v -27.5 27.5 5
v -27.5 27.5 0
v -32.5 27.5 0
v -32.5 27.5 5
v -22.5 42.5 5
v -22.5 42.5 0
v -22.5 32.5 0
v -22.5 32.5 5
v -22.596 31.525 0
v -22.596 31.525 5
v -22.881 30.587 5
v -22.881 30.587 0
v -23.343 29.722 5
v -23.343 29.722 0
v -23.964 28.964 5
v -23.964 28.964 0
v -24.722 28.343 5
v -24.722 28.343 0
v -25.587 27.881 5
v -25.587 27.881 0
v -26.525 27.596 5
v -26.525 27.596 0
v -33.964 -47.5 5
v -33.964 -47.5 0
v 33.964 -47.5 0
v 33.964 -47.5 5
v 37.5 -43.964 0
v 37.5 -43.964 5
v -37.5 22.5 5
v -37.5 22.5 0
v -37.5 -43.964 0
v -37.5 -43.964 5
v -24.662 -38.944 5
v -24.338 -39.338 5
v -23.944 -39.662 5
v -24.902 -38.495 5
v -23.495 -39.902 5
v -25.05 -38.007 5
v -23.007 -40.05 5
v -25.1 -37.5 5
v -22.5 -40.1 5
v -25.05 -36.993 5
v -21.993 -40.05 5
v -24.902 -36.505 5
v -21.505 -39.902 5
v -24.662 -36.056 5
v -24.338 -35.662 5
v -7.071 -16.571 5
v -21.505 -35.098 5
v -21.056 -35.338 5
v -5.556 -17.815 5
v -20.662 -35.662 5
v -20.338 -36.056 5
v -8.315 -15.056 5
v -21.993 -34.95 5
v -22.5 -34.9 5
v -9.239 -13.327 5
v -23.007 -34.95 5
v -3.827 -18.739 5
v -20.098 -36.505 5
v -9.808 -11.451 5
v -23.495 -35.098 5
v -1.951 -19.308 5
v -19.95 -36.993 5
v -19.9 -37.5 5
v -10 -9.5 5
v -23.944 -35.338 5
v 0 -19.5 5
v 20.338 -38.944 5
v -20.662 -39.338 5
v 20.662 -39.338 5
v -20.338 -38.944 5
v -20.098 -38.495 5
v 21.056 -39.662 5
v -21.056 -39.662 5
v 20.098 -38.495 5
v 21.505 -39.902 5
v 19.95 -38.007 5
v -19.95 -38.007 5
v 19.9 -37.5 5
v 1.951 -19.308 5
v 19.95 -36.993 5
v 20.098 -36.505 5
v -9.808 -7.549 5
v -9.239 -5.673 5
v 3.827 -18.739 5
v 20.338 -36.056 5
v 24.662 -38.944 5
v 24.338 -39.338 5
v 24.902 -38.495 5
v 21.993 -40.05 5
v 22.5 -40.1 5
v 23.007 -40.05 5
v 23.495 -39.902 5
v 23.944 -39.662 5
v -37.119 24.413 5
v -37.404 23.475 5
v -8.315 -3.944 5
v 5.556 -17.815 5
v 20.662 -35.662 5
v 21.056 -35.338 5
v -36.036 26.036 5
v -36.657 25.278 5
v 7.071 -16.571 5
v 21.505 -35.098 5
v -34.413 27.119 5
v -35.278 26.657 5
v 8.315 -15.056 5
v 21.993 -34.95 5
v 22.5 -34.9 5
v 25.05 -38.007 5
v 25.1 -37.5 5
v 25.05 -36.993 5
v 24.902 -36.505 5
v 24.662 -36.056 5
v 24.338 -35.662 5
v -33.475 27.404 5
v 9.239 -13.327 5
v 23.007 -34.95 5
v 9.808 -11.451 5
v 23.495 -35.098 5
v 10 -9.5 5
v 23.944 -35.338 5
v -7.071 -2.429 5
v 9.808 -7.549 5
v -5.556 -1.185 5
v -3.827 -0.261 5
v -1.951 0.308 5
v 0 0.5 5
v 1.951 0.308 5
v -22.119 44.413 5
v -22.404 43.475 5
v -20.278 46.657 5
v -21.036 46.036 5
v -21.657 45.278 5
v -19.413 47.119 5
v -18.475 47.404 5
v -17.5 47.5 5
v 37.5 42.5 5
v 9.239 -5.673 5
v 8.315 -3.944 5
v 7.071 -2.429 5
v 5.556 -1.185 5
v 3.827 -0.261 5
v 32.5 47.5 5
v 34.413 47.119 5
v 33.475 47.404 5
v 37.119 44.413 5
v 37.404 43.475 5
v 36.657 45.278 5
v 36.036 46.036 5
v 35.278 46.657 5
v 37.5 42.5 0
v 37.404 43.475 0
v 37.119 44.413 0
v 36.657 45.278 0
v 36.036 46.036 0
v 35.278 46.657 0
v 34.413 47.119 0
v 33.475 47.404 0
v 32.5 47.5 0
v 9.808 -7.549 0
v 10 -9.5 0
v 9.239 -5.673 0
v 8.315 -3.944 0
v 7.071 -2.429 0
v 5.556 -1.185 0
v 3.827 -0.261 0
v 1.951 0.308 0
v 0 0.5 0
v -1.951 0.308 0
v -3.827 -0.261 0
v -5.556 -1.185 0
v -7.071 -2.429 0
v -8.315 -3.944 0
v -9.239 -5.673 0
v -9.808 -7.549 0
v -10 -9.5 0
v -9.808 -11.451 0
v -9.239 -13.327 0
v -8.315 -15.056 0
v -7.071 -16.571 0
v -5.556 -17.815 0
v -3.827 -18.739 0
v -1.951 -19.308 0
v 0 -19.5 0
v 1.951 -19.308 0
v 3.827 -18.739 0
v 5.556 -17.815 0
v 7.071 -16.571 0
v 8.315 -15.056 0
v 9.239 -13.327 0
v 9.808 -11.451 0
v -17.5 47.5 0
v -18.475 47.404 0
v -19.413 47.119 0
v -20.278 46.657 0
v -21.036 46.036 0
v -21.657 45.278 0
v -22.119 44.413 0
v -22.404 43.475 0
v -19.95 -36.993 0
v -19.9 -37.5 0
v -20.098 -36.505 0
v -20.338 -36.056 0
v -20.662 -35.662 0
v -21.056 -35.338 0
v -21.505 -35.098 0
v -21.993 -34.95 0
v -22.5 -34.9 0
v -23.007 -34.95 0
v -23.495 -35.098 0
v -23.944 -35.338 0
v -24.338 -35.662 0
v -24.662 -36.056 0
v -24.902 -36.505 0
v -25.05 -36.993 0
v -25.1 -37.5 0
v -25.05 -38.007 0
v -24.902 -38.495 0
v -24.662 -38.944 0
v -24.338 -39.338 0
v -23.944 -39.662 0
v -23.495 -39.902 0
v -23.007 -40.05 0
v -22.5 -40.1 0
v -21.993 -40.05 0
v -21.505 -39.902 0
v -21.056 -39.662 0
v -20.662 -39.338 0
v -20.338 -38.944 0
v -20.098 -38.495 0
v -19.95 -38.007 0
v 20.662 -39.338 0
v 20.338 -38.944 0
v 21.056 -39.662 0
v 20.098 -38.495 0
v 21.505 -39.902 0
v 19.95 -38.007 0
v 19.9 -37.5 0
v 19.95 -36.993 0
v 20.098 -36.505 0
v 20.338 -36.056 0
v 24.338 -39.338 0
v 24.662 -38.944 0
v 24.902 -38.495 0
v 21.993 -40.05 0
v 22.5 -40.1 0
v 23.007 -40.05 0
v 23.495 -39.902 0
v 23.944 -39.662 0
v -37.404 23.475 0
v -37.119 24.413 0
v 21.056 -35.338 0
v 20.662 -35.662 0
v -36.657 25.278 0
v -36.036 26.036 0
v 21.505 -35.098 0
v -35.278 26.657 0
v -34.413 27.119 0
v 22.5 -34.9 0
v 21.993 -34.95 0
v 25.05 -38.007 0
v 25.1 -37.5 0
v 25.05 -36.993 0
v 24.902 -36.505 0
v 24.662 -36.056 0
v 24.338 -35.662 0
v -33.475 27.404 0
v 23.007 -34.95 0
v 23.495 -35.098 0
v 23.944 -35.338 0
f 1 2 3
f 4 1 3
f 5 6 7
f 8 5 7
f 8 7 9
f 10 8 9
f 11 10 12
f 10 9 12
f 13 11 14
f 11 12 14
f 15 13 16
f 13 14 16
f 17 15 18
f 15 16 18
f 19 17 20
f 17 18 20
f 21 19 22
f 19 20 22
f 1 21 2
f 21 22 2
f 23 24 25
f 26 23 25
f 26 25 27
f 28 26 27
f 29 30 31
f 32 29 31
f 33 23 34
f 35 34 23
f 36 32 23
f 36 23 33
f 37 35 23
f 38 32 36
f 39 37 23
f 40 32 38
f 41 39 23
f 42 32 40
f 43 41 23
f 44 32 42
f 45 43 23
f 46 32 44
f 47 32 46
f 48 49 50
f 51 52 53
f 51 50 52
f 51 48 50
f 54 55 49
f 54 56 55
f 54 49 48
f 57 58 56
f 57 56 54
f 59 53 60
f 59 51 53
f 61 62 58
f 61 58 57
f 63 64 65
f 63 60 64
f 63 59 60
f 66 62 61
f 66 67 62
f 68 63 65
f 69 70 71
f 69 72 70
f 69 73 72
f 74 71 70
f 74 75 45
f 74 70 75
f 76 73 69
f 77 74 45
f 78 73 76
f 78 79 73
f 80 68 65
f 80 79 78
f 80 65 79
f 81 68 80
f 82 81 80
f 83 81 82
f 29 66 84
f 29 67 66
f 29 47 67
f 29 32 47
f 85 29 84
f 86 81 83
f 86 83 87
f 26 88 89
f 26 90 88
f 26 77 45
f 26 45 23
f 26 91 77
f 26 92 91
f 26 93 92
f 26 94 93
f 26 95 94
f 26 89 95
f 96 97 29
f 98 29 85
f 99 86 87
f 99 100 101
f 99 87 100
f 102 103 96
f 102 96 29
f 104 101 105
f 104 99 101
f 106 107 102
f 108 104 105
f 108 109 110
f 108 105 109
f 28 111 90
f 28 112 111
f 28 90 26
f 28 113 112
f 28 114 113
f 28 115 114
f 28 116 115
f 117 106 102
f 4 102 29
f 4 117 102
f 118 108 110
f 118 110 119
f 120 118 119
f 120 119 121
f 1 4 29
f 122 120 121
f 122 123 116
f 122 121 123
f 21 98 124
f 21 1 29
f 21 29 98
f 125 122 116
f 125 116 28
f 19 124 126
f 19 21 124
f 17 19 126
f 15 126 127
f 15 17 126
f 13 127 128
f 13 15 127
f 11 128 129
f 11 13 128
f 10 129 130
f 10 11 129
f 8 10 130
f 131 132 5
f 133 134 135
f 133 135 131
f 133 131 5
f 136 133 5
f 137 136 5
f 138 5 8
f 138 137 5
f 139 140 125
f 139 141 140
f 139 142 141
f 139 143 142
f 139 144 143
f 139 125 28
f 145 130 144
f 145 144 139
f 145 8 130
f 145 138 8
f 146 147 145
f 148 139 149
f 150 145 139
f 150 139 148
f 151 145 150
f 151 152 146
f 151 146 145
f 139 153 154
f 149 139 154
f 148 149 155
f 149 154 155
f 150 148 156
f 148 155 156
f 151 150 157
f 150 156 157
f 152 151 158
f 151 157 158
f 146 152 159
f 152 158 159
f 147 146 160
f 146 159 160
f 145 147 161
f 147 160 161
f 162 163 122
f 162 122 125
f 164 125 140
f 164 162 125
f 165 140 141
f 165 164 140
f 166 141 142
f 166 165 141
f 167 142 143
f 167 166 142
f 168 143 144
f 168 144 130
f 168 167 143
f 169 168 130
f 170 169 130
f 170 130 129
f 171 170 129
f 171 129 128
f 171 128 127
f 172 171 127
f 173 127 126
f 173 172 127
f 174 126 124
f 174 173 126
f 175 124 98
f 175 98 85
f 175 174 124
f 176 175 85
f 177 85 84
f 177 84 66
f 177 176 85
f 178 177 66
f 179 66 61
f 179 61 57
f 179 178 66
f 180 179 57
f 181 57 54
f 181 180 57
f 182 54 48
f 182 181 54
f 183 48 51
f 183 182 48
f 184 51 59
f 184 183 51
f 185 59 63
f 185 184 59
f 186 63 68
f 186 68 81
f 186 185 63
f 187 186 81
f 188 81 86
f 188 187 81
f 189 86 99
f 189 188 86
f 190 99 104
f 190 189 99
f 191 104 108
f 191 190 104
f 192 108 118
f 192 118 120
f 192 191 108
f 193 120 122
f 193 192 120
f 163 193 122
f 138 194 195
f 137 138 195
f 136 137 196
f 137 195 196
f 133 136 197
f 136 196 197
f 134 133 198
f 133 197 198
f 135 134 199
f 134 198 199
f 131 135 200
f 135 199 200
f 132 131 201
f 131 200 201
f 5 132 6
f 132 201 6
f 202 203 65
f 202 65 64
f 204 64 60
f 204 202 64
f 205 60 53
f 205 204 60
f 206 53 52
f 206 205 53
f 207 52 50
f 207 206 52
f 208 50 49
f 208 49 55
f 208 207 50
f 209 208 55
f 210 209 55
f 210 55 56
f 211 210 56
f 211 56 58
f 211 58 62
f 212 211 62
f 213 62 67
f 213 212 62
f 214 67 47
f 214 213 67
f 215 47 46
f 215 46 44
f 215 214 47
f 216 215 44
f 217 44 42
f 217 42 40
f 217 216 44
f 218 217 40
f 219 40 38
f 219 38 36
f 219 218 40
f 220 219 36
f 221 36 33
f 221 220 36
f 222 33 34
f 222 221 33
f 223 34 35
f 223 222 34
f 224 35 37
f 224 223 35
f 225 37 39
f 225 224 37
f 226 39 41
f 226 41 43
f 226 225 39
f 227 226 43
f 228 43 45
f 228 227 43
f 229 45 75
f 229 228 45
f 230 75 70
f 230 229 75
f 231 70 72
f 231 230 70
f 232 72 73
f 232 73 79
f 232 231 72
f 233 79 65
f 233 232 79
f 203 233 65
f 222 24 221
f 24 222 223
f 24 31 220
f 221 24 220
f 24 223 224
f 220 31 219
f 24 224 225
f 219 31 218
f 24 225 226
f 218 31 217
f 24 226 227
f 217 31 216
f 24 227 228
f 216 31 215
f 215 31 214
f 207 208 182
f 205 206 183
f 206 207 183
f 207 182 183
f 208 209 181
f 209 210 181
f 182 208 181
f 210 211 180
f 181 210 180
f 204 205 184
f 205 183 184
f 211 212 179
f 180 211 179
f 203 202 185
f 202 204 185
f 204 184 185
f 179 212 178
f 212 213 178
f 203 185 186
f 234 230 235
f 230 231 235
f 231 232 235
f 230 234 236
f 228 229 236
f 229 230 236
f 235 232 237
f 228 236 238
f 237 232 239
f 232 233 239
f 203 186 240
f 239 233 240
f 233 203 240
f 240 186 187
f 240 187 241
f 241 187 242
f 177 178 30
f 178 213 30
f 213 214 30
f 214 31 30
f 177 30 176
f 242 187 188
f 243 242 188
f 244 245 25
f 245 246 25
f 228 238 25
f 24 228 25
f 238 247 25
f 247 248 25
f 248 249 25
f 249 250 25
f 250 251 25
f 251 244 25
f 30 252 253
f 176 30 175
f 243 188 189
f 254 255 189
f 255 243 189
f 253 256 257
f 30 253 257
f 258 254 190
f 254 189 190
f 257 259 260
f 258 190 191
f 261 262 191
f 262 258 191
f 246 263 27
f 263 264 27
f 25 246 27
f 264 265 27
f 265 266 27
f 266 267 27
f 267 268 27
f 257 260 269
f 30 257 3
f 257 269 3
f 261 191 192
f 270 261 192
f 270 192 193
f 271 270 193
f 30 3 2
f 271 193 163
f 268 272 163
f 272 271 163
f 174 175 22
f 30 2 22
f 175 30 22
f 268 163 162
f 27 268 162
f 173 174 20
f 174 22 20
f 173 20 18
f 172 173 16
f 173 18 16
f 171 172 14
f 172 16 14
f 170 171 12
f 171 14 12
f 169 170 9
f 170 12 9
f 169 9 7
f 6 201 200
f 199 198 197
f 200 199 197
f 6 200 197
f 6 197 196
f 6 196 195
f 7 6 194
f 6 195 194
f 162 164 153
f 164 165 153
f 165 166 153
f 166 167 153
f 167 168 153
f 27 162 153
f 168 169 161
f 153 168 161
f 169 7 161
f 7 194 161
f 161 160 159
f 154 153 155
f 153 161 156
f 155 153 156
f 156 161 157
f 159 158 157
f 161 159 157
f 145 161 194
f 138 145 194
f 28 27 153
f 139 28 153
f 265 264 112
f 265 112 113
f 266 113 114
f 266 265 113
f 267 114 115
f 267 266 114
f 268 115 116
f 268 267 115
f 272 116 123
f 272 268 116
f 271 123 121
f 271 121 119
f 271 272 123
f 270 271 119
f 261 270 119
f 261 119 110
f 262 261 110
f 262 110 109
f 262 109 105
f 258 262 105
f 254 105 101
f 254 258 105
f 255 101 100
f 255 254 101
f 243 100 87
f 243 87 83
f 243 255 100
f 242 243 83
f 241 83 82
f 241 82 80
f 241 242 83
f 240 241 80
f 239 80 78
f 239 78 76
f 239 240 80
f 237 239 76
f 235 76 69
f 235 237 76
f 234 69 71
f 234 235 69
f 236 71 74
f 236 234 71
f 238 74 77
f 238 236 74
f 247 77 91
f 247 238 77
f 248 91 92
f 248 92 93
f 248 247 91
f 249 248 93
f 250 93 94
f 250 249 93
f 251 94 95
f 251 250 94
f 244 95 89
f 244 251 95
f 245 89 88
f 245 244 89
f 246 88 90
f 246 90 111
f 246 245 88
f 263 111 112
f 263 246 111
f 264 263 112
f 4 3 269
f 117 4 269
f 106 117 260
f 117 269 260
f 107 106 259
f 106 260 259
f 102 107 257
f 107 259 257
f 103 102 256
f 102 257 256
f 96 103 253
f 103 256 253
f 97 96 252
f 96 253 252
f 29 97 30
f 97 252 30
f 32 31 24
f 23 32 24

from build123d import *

# Parameters (mm, degrees)
F0_R     = 2.6
F0_R_2   = 10
F1_DEPTH = 5


with BuildPart() as f1:
    # F0 (on Top) → F1 (new body)
    with BuildSketch(Plane.XY):
        with BuildLine():
            Line((-33.964466, -47.5), (33.964466, -47.5))
            Line((33.964466, -47.5), (37.5, -43.964466))
            Line((37.5, -43.964466), (37.5, 42.5))
            ThreePointArc((37.5, 42.5), (36.035534, 46.035534), (32.5, 47.5))
            Line((32.5, 47.5), (-17.5, 47.5))
            ThreePointArc((-17.5, 47.5), (-21.035534, 46.035534), (-22.5, 42.5))
            Line((-22.5, 42.5), (-22.5, 32.5))
            ThreePointArc((-22.5, 32.5), (-23.964466, 28.964466), (-27.5, 27.5))
            Line((-27.5, 27.5), (-32.5, 27.5))
            ThreePointArc((-32.5, 27.5), (-36.035534, 26.035534), (-37.5, 22.5))
            Line((-37.5, 22.5), (-37.5, -43.964466))
            Line((-37.5, -43.964466), (-33.964466, -47.5))
        make_face()
        with Locations((-22.5, -37.5)):
            Circle(F0_R, mode=Mode.SUBTRACT)
        with Locations((22.5, -37.5)):
            Circle(F0_R, mode=Mode.SUBTRACT)
        with Locations((0, -9.5)):
            Circle(F0_R_2, mode=Mode.SUBTRACT)
    extrude(amount=F1_DEPTH)


solid = f1.part
